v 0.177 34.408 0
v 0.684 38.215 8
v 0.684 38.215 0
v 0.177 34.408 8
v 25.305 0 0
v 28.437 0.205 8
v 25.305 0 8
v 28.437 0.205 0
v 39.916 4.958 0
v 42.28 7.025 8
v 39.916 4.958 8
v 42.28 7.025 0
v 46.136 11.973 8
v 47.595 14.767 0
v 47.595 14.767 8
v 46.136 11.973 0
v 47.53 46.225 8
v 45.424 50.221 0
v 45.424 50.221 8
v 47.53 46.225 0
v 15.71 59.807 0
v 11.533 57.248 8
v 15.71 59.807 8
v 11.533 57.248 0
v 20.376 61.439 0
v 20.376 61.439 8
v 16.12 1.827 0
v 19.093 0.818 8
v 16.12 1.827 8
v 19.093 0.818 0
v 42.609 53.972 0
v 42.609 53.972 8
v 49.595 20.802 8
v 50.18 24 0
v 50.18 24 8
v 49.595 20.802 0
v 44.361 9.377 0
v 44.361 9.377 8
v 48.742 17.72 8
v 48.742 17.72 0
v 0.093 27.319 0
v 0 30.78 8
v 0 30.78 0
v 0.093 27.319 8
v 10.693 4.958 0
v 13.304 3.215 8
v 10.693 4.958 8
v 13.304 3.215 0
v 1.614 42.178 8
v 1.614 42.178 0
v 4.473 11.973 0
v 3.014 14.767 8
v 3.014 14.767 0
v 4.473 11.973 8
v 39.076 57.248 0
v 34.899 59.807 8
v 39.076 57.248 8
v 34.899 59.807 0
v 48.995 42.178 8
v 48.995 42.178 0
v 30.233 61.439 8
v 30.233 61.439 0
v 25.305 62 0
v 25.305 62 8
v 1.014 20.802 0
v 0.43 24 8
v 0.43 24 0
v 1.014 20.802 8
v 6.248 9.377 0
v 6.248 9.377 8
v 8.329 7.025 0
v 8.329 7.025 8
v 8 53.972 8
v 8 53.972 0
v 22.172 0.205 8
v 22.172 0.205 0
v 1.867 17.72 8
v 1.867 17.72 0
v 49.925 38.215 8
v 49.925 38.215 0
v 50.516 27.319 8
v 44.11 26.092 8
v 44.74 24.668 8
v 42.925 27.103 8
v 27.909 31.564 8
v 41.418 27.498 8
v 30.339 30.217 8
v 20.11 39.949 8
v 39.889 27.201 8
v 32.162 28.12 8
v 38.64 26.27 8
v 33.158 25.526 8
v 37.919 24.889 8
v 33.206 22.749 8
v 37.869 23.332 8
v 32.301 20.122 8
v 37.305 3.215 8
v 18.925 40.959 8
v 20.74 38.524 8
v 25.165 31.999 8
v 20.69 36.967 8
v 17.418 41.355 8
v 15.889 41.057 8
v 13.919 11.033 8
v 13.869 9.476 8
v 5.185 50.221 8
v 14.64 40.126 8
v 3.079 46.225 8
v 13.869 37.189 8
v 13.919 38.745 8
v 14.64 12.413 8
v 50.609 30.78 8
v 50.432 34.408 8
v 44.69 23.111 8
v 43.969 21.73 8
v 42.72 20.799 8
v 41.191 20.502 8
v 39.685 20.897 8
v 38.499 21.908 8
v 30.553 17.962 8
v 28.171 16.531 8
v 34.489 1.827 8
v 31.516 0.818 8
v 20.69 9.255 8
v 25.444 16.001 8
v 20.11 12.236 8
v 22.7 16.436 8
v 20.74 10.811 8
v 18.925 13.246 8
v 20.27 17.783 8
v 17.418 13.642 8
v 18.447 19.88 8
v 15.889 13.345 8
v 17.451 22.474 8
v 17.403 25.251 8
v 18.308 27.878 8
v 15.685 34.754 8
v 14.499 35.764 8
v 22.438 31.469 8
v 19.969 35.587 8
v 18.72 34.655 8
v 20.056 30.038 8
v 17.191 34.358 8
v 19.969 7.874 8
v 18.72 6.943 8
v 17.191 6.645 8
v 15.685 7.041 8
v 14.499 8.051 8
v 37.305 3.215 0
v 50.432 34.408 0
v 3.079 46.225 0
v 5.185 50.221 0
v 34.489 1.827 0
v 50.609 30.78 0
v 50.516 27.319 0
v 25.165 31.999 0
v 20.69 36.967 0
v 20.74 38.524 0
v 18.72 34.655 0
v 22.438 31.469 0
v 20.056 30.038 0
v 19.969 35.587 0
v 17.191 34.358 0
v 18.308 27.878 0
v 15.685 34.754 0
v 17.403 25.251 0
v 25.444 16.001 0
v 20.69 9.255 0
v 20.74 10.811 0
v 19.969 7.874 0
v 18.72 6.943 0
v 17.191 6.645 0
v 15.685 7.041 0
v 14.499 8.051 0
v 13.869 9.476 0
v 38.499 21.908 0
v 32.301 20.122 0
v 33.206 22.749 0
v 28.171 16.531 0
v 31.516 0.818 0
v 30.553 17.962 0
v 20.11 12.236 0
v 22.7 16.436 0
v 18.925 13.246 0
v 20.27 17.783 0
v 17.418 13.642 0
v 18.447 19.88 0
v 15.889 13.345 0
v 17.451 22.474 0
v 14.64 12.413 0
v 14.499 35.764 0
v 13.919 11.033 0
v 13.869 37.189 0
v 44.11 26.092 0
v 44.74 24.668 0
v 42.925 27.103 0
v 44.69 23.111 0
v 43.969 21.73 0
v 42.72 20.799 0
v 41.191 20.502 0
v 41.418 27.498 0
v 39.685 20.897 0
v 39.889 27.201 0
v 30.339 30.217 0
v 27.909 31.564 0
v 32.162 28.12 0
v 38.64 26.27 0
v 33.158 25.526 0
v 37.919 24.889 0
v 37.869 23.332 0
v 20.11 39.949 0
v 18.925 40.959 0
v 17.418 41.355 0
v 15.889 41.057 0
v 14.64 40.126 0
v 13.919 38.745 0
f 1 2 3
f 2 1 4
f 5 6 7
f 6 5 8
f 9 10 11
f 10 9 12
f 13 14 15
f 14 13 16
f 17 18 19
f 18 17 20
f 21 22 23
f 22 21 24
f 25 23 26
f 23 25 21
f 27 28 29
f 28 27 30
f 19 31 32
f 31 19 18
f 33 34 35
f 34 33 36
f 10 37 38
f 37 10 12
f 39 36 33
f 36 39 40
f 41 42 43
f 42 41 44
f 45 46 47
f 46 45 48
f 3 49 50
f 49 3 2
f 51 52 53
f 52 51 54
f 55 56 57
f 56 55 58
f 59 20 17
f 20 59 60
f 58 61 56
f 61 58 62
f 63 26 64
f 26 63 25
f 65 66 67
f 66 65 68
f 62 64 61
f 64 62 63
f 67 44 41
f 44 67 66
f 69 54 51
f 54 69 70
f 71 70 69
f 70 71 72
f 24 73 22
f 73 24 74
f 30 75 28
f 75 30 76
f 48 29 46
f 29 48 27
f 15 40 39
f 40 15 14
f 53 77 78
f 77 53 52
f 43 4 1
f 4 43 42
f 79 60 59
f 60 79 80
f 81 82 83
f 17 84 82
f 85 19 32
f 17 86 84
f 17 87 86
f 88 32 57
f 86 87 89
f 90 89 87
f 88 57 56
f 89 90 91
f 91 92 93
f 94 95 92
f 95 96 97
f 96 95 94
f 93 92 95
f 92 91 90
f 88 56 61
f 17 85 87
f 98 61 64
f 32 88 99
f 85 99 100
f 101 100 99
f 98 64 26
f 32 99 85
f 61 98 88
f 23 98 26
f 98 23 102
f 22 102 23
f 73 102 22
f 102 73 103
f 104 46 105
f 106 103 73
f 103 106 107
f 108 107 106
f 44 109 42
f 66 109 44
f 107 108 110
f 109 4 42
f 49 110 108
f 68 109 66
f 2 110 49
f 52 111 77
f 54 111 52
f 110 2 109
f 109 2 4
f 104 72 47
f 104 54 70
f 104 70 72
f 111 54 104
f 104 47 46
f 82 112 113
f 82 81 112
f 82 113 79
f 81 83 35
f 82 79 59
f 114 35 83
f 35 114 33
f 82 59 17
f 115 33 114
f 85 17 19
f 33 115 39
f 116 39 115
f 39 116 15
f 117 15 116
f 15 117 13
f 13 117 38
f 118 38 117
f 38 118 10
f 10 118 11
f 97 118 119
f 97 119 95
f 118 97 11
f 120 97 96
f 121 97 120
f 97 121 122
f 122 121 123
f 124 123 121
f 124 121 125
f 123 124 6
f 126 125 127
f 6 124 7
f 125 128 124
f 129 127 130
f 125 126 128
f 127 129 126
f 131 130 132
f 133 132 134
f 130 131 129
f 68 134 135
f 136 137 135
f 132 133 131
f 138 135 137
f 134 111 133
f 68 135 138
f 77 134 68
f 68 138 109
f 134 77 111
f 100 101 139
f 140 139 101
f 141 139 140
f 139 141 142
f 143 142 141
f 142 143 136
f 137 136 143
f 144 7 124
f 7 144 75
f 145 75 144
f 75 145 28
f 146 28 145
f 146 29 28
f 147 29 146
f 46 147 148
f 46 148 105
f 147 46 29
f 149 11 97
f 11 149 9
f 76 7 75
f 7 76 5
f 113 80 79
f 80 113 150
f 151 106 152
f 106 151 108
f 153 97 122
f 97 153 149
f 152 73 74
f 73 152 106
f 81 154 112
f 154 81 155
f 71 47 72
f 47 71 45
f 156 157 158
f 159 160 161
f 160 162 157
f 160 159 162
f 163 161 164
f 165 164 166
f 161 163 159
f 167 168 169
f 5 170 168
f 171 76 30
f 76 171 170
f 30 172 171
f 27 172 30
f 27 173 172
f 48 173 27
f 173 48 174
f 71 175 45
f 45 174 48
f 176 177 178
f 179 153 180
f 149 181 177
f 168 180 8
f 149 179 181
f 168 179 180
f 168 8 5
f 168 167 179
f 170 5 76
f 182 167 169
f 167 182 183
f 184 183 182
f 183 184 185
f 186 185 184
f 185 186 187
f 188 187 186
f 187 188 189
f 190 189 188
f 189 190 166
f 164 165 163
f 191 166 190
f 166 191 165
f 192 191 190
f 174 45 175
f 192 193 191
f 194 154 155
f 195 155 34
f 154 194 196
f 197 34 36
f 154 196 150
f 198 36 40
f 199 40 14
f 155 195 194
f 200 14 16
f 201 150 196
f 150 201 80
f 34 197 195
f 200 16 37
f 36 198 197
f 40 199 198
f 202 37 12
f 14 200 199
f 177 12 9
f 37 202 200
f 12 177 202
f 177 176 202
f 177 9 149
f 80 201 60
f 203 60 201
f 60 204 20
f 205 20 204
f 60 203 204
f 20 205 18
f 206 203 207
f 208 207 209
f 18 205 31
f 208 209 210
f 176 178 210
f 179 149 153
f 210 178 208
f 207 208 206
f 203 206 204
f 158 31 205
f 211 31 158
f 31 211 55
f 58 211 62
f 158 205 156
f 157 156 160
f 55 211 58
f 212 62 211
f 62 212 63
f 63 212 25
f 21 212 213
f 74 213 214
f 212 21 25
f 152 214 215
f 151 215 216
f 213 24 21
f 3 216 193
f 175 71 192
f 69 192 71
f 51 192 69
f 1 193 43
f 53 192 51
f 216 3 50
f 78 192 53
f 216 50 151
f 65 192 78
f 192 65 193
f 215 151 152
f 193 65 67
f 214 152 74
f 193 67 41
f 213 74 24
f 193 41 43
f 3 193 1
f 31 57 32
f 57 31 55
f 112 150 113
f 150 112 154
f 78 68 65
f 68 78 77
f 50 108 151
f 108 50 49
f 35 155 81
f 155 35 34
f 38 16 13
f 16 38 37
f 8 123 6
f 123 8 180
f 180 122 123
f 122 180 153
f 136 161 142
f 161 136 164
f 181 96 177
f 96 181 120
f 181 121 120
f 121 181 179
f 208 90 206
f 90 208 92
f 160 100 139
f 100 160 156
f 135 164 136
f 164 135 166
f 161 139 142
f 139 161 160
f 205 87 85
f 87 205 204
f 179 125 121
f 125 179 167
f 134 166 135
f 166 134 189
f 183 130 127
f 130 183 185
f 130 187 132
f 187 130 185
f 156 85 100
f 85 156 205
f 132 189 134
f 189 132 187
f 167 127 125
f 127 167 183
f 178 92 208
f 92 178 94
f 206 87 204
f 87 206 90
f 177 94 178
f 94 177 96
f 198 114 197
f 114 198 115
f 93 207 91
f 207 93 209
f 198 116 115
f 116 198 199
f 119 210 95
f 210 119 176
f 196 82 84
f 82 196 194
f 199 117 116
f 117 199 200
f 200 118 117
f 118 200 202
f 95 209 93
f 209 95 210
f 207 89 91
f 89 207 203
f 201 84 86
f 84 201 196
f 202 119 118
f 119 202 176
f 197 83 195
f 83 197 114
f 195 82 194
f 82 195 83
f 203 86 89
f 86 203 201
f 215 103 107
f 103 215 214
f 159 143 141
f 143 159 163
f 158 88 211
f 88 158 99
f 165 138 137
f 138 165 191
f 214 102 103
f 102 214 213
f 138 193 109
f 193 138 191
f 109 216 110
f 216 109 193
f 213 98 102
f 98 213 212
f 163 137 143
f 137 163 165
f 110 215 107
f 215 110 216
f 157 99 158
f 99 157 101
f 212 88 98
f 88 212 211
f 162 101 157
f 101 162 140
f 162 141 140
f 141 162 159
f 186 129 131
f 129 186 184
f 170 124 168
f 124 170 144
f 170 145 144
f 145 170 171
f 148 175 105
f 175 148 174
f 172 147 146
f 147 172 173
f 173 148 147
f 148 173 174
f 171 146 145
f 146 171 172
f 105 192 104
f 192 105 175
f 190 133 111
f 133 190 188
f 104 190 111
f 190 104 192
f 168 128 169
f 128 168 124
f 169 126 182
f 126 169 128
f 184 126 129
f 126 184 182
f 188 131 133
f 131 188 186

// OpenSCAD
$fn = 32;

// ----------------------------------------------------------------------
// Cam plate: single_lobe cam, base R24
// ----------------------------------------------------------------------

// --- parameters (mm) ---
base_r = 24;              // base circle radius
lobe_h = 14;              // cam lobe rise
bore_r = 8;               // shaft bore radius
plate_t = 8;              // plate thickness, Z (extrusion height)
ring_r = 16;              // lightening ring radius
bolt_r = 3.5;             // lightening hole radius

profile = [[50.18, 24], [50.516, 27.319], [50.609, 30.78], [50.432, 34.408], [49.925, 38.215], [48.995, 42.178], [47.53, 46.225], [45.424, 50.221], [42.609, 53.972], [39.076, 57.248], [34.899, 59.807], [30.233, 61.439], [25.305, 62], [20.376, 61.439], [15.71, 59.807], [11.533, 57.248], [8, 53.972], [5.185, 50.221], [3.079, 46.225], [1.614, 42.178], [0.684, 38.215], [0.177, 34.408], [0, 30.78], [0.093, 27.319], [0.43, 24], [1.014, 20.802], [1.867, 17.72], [3.014, 14.767], [4.473, 11.973], [6.248, 9.377], [8.329, 7.025], [10.693, 4.958], [13.304, 3.215], [16.12, 1.827], [19.093, 0.818], [22.172, 0.205], [25.305, 0], [28.437, 0.205], [31.516, 0.818], [34.489, 1.827], [37.305, 3.215], [39.916, 4.958], [42.28, 7.025], [44.361, 9.377], [46.136, 11.973], [47.595, 14.767], [48.742, 17.72], [49.595, 20.802]];  // primary outline, 48 points, counter clockwise
void_1 = [[33.158, 25.526], [32.162, 28.12], [30.339, 30.217], [27.909, 31.564], [25.165, 31.999], [22.438, 31.469], [20.056, 30.038], [18.308, 27.878], [17.403, 25.251], [17.451, 22.474], [18.447, 19.88], [20.27, 17.783], [22.7, 16.436], [25.444, 16.001], [28.171, 16.531], [30.553, 17.962], [32.301, 20.122], [33.206, 22.749]];  // shaft bore, 18 points
void_2 = [[44.74, 24.668], [44.11, 26.092], [42.925, 27.103], [41.418, 27.498], [39.889, 27.201], [38.64, 26.27], [37.919, 24.889], [37.869, 23.332], [38.499, 21.908], [39.685, 20.897], [41.191, 20.502], [42.72, 20.799], [43.969, 21.73], [44.69, 23.111]];  // lightening hole 1, 14 points
void_3 = [[20.74, 38.524], [20.11, 39.949], [18.925, 40.959], [17.418, 41.355], [15.889, 41.057], [14.64, 40.126], [13.919, 38.745], [13.869, 37.189], [14.499, 35.764], [15.685, 34.754], [17.191, 34.358], [18.72, 34.655], [19.969, 35.587], [20.69, 36.967]];  // lightening hole 2, 14 points
void_4 = [[20.74, 10.811], [20.11, 12.236], [18.925, 13.246], [17.418, 13.642], [15.889, 13.345], [14.64, 12.413], [13.919, 11.033], [13.869, 9.476], [14.499, 8.051], [15.685, 7.041], [17.191, 6.645], [18.72, 6.943], [19.969, 7.874], [20.69, 9.255]];  // lightening hole 3, 14 points

// --- the one profile operation ---
difference() {
  linear_extrude(height = plate_t) polygon(points = profile);
  translate([0, 0, -1])
    linear_extrude(height = plate_t + 2) polygon(points = void_1);
  translate([0, 0, -1])
    linear_extrude(height = plate_t + 2) polygon(points = void_2);
  translate([0, 0, -1])
    linear_extrude(height = plate_t + 2) polygon(points = void_3);
  translate([0, 0, -1])
    linear_extrude(height = plate_t + 2) polygon(points = void_4);
}
